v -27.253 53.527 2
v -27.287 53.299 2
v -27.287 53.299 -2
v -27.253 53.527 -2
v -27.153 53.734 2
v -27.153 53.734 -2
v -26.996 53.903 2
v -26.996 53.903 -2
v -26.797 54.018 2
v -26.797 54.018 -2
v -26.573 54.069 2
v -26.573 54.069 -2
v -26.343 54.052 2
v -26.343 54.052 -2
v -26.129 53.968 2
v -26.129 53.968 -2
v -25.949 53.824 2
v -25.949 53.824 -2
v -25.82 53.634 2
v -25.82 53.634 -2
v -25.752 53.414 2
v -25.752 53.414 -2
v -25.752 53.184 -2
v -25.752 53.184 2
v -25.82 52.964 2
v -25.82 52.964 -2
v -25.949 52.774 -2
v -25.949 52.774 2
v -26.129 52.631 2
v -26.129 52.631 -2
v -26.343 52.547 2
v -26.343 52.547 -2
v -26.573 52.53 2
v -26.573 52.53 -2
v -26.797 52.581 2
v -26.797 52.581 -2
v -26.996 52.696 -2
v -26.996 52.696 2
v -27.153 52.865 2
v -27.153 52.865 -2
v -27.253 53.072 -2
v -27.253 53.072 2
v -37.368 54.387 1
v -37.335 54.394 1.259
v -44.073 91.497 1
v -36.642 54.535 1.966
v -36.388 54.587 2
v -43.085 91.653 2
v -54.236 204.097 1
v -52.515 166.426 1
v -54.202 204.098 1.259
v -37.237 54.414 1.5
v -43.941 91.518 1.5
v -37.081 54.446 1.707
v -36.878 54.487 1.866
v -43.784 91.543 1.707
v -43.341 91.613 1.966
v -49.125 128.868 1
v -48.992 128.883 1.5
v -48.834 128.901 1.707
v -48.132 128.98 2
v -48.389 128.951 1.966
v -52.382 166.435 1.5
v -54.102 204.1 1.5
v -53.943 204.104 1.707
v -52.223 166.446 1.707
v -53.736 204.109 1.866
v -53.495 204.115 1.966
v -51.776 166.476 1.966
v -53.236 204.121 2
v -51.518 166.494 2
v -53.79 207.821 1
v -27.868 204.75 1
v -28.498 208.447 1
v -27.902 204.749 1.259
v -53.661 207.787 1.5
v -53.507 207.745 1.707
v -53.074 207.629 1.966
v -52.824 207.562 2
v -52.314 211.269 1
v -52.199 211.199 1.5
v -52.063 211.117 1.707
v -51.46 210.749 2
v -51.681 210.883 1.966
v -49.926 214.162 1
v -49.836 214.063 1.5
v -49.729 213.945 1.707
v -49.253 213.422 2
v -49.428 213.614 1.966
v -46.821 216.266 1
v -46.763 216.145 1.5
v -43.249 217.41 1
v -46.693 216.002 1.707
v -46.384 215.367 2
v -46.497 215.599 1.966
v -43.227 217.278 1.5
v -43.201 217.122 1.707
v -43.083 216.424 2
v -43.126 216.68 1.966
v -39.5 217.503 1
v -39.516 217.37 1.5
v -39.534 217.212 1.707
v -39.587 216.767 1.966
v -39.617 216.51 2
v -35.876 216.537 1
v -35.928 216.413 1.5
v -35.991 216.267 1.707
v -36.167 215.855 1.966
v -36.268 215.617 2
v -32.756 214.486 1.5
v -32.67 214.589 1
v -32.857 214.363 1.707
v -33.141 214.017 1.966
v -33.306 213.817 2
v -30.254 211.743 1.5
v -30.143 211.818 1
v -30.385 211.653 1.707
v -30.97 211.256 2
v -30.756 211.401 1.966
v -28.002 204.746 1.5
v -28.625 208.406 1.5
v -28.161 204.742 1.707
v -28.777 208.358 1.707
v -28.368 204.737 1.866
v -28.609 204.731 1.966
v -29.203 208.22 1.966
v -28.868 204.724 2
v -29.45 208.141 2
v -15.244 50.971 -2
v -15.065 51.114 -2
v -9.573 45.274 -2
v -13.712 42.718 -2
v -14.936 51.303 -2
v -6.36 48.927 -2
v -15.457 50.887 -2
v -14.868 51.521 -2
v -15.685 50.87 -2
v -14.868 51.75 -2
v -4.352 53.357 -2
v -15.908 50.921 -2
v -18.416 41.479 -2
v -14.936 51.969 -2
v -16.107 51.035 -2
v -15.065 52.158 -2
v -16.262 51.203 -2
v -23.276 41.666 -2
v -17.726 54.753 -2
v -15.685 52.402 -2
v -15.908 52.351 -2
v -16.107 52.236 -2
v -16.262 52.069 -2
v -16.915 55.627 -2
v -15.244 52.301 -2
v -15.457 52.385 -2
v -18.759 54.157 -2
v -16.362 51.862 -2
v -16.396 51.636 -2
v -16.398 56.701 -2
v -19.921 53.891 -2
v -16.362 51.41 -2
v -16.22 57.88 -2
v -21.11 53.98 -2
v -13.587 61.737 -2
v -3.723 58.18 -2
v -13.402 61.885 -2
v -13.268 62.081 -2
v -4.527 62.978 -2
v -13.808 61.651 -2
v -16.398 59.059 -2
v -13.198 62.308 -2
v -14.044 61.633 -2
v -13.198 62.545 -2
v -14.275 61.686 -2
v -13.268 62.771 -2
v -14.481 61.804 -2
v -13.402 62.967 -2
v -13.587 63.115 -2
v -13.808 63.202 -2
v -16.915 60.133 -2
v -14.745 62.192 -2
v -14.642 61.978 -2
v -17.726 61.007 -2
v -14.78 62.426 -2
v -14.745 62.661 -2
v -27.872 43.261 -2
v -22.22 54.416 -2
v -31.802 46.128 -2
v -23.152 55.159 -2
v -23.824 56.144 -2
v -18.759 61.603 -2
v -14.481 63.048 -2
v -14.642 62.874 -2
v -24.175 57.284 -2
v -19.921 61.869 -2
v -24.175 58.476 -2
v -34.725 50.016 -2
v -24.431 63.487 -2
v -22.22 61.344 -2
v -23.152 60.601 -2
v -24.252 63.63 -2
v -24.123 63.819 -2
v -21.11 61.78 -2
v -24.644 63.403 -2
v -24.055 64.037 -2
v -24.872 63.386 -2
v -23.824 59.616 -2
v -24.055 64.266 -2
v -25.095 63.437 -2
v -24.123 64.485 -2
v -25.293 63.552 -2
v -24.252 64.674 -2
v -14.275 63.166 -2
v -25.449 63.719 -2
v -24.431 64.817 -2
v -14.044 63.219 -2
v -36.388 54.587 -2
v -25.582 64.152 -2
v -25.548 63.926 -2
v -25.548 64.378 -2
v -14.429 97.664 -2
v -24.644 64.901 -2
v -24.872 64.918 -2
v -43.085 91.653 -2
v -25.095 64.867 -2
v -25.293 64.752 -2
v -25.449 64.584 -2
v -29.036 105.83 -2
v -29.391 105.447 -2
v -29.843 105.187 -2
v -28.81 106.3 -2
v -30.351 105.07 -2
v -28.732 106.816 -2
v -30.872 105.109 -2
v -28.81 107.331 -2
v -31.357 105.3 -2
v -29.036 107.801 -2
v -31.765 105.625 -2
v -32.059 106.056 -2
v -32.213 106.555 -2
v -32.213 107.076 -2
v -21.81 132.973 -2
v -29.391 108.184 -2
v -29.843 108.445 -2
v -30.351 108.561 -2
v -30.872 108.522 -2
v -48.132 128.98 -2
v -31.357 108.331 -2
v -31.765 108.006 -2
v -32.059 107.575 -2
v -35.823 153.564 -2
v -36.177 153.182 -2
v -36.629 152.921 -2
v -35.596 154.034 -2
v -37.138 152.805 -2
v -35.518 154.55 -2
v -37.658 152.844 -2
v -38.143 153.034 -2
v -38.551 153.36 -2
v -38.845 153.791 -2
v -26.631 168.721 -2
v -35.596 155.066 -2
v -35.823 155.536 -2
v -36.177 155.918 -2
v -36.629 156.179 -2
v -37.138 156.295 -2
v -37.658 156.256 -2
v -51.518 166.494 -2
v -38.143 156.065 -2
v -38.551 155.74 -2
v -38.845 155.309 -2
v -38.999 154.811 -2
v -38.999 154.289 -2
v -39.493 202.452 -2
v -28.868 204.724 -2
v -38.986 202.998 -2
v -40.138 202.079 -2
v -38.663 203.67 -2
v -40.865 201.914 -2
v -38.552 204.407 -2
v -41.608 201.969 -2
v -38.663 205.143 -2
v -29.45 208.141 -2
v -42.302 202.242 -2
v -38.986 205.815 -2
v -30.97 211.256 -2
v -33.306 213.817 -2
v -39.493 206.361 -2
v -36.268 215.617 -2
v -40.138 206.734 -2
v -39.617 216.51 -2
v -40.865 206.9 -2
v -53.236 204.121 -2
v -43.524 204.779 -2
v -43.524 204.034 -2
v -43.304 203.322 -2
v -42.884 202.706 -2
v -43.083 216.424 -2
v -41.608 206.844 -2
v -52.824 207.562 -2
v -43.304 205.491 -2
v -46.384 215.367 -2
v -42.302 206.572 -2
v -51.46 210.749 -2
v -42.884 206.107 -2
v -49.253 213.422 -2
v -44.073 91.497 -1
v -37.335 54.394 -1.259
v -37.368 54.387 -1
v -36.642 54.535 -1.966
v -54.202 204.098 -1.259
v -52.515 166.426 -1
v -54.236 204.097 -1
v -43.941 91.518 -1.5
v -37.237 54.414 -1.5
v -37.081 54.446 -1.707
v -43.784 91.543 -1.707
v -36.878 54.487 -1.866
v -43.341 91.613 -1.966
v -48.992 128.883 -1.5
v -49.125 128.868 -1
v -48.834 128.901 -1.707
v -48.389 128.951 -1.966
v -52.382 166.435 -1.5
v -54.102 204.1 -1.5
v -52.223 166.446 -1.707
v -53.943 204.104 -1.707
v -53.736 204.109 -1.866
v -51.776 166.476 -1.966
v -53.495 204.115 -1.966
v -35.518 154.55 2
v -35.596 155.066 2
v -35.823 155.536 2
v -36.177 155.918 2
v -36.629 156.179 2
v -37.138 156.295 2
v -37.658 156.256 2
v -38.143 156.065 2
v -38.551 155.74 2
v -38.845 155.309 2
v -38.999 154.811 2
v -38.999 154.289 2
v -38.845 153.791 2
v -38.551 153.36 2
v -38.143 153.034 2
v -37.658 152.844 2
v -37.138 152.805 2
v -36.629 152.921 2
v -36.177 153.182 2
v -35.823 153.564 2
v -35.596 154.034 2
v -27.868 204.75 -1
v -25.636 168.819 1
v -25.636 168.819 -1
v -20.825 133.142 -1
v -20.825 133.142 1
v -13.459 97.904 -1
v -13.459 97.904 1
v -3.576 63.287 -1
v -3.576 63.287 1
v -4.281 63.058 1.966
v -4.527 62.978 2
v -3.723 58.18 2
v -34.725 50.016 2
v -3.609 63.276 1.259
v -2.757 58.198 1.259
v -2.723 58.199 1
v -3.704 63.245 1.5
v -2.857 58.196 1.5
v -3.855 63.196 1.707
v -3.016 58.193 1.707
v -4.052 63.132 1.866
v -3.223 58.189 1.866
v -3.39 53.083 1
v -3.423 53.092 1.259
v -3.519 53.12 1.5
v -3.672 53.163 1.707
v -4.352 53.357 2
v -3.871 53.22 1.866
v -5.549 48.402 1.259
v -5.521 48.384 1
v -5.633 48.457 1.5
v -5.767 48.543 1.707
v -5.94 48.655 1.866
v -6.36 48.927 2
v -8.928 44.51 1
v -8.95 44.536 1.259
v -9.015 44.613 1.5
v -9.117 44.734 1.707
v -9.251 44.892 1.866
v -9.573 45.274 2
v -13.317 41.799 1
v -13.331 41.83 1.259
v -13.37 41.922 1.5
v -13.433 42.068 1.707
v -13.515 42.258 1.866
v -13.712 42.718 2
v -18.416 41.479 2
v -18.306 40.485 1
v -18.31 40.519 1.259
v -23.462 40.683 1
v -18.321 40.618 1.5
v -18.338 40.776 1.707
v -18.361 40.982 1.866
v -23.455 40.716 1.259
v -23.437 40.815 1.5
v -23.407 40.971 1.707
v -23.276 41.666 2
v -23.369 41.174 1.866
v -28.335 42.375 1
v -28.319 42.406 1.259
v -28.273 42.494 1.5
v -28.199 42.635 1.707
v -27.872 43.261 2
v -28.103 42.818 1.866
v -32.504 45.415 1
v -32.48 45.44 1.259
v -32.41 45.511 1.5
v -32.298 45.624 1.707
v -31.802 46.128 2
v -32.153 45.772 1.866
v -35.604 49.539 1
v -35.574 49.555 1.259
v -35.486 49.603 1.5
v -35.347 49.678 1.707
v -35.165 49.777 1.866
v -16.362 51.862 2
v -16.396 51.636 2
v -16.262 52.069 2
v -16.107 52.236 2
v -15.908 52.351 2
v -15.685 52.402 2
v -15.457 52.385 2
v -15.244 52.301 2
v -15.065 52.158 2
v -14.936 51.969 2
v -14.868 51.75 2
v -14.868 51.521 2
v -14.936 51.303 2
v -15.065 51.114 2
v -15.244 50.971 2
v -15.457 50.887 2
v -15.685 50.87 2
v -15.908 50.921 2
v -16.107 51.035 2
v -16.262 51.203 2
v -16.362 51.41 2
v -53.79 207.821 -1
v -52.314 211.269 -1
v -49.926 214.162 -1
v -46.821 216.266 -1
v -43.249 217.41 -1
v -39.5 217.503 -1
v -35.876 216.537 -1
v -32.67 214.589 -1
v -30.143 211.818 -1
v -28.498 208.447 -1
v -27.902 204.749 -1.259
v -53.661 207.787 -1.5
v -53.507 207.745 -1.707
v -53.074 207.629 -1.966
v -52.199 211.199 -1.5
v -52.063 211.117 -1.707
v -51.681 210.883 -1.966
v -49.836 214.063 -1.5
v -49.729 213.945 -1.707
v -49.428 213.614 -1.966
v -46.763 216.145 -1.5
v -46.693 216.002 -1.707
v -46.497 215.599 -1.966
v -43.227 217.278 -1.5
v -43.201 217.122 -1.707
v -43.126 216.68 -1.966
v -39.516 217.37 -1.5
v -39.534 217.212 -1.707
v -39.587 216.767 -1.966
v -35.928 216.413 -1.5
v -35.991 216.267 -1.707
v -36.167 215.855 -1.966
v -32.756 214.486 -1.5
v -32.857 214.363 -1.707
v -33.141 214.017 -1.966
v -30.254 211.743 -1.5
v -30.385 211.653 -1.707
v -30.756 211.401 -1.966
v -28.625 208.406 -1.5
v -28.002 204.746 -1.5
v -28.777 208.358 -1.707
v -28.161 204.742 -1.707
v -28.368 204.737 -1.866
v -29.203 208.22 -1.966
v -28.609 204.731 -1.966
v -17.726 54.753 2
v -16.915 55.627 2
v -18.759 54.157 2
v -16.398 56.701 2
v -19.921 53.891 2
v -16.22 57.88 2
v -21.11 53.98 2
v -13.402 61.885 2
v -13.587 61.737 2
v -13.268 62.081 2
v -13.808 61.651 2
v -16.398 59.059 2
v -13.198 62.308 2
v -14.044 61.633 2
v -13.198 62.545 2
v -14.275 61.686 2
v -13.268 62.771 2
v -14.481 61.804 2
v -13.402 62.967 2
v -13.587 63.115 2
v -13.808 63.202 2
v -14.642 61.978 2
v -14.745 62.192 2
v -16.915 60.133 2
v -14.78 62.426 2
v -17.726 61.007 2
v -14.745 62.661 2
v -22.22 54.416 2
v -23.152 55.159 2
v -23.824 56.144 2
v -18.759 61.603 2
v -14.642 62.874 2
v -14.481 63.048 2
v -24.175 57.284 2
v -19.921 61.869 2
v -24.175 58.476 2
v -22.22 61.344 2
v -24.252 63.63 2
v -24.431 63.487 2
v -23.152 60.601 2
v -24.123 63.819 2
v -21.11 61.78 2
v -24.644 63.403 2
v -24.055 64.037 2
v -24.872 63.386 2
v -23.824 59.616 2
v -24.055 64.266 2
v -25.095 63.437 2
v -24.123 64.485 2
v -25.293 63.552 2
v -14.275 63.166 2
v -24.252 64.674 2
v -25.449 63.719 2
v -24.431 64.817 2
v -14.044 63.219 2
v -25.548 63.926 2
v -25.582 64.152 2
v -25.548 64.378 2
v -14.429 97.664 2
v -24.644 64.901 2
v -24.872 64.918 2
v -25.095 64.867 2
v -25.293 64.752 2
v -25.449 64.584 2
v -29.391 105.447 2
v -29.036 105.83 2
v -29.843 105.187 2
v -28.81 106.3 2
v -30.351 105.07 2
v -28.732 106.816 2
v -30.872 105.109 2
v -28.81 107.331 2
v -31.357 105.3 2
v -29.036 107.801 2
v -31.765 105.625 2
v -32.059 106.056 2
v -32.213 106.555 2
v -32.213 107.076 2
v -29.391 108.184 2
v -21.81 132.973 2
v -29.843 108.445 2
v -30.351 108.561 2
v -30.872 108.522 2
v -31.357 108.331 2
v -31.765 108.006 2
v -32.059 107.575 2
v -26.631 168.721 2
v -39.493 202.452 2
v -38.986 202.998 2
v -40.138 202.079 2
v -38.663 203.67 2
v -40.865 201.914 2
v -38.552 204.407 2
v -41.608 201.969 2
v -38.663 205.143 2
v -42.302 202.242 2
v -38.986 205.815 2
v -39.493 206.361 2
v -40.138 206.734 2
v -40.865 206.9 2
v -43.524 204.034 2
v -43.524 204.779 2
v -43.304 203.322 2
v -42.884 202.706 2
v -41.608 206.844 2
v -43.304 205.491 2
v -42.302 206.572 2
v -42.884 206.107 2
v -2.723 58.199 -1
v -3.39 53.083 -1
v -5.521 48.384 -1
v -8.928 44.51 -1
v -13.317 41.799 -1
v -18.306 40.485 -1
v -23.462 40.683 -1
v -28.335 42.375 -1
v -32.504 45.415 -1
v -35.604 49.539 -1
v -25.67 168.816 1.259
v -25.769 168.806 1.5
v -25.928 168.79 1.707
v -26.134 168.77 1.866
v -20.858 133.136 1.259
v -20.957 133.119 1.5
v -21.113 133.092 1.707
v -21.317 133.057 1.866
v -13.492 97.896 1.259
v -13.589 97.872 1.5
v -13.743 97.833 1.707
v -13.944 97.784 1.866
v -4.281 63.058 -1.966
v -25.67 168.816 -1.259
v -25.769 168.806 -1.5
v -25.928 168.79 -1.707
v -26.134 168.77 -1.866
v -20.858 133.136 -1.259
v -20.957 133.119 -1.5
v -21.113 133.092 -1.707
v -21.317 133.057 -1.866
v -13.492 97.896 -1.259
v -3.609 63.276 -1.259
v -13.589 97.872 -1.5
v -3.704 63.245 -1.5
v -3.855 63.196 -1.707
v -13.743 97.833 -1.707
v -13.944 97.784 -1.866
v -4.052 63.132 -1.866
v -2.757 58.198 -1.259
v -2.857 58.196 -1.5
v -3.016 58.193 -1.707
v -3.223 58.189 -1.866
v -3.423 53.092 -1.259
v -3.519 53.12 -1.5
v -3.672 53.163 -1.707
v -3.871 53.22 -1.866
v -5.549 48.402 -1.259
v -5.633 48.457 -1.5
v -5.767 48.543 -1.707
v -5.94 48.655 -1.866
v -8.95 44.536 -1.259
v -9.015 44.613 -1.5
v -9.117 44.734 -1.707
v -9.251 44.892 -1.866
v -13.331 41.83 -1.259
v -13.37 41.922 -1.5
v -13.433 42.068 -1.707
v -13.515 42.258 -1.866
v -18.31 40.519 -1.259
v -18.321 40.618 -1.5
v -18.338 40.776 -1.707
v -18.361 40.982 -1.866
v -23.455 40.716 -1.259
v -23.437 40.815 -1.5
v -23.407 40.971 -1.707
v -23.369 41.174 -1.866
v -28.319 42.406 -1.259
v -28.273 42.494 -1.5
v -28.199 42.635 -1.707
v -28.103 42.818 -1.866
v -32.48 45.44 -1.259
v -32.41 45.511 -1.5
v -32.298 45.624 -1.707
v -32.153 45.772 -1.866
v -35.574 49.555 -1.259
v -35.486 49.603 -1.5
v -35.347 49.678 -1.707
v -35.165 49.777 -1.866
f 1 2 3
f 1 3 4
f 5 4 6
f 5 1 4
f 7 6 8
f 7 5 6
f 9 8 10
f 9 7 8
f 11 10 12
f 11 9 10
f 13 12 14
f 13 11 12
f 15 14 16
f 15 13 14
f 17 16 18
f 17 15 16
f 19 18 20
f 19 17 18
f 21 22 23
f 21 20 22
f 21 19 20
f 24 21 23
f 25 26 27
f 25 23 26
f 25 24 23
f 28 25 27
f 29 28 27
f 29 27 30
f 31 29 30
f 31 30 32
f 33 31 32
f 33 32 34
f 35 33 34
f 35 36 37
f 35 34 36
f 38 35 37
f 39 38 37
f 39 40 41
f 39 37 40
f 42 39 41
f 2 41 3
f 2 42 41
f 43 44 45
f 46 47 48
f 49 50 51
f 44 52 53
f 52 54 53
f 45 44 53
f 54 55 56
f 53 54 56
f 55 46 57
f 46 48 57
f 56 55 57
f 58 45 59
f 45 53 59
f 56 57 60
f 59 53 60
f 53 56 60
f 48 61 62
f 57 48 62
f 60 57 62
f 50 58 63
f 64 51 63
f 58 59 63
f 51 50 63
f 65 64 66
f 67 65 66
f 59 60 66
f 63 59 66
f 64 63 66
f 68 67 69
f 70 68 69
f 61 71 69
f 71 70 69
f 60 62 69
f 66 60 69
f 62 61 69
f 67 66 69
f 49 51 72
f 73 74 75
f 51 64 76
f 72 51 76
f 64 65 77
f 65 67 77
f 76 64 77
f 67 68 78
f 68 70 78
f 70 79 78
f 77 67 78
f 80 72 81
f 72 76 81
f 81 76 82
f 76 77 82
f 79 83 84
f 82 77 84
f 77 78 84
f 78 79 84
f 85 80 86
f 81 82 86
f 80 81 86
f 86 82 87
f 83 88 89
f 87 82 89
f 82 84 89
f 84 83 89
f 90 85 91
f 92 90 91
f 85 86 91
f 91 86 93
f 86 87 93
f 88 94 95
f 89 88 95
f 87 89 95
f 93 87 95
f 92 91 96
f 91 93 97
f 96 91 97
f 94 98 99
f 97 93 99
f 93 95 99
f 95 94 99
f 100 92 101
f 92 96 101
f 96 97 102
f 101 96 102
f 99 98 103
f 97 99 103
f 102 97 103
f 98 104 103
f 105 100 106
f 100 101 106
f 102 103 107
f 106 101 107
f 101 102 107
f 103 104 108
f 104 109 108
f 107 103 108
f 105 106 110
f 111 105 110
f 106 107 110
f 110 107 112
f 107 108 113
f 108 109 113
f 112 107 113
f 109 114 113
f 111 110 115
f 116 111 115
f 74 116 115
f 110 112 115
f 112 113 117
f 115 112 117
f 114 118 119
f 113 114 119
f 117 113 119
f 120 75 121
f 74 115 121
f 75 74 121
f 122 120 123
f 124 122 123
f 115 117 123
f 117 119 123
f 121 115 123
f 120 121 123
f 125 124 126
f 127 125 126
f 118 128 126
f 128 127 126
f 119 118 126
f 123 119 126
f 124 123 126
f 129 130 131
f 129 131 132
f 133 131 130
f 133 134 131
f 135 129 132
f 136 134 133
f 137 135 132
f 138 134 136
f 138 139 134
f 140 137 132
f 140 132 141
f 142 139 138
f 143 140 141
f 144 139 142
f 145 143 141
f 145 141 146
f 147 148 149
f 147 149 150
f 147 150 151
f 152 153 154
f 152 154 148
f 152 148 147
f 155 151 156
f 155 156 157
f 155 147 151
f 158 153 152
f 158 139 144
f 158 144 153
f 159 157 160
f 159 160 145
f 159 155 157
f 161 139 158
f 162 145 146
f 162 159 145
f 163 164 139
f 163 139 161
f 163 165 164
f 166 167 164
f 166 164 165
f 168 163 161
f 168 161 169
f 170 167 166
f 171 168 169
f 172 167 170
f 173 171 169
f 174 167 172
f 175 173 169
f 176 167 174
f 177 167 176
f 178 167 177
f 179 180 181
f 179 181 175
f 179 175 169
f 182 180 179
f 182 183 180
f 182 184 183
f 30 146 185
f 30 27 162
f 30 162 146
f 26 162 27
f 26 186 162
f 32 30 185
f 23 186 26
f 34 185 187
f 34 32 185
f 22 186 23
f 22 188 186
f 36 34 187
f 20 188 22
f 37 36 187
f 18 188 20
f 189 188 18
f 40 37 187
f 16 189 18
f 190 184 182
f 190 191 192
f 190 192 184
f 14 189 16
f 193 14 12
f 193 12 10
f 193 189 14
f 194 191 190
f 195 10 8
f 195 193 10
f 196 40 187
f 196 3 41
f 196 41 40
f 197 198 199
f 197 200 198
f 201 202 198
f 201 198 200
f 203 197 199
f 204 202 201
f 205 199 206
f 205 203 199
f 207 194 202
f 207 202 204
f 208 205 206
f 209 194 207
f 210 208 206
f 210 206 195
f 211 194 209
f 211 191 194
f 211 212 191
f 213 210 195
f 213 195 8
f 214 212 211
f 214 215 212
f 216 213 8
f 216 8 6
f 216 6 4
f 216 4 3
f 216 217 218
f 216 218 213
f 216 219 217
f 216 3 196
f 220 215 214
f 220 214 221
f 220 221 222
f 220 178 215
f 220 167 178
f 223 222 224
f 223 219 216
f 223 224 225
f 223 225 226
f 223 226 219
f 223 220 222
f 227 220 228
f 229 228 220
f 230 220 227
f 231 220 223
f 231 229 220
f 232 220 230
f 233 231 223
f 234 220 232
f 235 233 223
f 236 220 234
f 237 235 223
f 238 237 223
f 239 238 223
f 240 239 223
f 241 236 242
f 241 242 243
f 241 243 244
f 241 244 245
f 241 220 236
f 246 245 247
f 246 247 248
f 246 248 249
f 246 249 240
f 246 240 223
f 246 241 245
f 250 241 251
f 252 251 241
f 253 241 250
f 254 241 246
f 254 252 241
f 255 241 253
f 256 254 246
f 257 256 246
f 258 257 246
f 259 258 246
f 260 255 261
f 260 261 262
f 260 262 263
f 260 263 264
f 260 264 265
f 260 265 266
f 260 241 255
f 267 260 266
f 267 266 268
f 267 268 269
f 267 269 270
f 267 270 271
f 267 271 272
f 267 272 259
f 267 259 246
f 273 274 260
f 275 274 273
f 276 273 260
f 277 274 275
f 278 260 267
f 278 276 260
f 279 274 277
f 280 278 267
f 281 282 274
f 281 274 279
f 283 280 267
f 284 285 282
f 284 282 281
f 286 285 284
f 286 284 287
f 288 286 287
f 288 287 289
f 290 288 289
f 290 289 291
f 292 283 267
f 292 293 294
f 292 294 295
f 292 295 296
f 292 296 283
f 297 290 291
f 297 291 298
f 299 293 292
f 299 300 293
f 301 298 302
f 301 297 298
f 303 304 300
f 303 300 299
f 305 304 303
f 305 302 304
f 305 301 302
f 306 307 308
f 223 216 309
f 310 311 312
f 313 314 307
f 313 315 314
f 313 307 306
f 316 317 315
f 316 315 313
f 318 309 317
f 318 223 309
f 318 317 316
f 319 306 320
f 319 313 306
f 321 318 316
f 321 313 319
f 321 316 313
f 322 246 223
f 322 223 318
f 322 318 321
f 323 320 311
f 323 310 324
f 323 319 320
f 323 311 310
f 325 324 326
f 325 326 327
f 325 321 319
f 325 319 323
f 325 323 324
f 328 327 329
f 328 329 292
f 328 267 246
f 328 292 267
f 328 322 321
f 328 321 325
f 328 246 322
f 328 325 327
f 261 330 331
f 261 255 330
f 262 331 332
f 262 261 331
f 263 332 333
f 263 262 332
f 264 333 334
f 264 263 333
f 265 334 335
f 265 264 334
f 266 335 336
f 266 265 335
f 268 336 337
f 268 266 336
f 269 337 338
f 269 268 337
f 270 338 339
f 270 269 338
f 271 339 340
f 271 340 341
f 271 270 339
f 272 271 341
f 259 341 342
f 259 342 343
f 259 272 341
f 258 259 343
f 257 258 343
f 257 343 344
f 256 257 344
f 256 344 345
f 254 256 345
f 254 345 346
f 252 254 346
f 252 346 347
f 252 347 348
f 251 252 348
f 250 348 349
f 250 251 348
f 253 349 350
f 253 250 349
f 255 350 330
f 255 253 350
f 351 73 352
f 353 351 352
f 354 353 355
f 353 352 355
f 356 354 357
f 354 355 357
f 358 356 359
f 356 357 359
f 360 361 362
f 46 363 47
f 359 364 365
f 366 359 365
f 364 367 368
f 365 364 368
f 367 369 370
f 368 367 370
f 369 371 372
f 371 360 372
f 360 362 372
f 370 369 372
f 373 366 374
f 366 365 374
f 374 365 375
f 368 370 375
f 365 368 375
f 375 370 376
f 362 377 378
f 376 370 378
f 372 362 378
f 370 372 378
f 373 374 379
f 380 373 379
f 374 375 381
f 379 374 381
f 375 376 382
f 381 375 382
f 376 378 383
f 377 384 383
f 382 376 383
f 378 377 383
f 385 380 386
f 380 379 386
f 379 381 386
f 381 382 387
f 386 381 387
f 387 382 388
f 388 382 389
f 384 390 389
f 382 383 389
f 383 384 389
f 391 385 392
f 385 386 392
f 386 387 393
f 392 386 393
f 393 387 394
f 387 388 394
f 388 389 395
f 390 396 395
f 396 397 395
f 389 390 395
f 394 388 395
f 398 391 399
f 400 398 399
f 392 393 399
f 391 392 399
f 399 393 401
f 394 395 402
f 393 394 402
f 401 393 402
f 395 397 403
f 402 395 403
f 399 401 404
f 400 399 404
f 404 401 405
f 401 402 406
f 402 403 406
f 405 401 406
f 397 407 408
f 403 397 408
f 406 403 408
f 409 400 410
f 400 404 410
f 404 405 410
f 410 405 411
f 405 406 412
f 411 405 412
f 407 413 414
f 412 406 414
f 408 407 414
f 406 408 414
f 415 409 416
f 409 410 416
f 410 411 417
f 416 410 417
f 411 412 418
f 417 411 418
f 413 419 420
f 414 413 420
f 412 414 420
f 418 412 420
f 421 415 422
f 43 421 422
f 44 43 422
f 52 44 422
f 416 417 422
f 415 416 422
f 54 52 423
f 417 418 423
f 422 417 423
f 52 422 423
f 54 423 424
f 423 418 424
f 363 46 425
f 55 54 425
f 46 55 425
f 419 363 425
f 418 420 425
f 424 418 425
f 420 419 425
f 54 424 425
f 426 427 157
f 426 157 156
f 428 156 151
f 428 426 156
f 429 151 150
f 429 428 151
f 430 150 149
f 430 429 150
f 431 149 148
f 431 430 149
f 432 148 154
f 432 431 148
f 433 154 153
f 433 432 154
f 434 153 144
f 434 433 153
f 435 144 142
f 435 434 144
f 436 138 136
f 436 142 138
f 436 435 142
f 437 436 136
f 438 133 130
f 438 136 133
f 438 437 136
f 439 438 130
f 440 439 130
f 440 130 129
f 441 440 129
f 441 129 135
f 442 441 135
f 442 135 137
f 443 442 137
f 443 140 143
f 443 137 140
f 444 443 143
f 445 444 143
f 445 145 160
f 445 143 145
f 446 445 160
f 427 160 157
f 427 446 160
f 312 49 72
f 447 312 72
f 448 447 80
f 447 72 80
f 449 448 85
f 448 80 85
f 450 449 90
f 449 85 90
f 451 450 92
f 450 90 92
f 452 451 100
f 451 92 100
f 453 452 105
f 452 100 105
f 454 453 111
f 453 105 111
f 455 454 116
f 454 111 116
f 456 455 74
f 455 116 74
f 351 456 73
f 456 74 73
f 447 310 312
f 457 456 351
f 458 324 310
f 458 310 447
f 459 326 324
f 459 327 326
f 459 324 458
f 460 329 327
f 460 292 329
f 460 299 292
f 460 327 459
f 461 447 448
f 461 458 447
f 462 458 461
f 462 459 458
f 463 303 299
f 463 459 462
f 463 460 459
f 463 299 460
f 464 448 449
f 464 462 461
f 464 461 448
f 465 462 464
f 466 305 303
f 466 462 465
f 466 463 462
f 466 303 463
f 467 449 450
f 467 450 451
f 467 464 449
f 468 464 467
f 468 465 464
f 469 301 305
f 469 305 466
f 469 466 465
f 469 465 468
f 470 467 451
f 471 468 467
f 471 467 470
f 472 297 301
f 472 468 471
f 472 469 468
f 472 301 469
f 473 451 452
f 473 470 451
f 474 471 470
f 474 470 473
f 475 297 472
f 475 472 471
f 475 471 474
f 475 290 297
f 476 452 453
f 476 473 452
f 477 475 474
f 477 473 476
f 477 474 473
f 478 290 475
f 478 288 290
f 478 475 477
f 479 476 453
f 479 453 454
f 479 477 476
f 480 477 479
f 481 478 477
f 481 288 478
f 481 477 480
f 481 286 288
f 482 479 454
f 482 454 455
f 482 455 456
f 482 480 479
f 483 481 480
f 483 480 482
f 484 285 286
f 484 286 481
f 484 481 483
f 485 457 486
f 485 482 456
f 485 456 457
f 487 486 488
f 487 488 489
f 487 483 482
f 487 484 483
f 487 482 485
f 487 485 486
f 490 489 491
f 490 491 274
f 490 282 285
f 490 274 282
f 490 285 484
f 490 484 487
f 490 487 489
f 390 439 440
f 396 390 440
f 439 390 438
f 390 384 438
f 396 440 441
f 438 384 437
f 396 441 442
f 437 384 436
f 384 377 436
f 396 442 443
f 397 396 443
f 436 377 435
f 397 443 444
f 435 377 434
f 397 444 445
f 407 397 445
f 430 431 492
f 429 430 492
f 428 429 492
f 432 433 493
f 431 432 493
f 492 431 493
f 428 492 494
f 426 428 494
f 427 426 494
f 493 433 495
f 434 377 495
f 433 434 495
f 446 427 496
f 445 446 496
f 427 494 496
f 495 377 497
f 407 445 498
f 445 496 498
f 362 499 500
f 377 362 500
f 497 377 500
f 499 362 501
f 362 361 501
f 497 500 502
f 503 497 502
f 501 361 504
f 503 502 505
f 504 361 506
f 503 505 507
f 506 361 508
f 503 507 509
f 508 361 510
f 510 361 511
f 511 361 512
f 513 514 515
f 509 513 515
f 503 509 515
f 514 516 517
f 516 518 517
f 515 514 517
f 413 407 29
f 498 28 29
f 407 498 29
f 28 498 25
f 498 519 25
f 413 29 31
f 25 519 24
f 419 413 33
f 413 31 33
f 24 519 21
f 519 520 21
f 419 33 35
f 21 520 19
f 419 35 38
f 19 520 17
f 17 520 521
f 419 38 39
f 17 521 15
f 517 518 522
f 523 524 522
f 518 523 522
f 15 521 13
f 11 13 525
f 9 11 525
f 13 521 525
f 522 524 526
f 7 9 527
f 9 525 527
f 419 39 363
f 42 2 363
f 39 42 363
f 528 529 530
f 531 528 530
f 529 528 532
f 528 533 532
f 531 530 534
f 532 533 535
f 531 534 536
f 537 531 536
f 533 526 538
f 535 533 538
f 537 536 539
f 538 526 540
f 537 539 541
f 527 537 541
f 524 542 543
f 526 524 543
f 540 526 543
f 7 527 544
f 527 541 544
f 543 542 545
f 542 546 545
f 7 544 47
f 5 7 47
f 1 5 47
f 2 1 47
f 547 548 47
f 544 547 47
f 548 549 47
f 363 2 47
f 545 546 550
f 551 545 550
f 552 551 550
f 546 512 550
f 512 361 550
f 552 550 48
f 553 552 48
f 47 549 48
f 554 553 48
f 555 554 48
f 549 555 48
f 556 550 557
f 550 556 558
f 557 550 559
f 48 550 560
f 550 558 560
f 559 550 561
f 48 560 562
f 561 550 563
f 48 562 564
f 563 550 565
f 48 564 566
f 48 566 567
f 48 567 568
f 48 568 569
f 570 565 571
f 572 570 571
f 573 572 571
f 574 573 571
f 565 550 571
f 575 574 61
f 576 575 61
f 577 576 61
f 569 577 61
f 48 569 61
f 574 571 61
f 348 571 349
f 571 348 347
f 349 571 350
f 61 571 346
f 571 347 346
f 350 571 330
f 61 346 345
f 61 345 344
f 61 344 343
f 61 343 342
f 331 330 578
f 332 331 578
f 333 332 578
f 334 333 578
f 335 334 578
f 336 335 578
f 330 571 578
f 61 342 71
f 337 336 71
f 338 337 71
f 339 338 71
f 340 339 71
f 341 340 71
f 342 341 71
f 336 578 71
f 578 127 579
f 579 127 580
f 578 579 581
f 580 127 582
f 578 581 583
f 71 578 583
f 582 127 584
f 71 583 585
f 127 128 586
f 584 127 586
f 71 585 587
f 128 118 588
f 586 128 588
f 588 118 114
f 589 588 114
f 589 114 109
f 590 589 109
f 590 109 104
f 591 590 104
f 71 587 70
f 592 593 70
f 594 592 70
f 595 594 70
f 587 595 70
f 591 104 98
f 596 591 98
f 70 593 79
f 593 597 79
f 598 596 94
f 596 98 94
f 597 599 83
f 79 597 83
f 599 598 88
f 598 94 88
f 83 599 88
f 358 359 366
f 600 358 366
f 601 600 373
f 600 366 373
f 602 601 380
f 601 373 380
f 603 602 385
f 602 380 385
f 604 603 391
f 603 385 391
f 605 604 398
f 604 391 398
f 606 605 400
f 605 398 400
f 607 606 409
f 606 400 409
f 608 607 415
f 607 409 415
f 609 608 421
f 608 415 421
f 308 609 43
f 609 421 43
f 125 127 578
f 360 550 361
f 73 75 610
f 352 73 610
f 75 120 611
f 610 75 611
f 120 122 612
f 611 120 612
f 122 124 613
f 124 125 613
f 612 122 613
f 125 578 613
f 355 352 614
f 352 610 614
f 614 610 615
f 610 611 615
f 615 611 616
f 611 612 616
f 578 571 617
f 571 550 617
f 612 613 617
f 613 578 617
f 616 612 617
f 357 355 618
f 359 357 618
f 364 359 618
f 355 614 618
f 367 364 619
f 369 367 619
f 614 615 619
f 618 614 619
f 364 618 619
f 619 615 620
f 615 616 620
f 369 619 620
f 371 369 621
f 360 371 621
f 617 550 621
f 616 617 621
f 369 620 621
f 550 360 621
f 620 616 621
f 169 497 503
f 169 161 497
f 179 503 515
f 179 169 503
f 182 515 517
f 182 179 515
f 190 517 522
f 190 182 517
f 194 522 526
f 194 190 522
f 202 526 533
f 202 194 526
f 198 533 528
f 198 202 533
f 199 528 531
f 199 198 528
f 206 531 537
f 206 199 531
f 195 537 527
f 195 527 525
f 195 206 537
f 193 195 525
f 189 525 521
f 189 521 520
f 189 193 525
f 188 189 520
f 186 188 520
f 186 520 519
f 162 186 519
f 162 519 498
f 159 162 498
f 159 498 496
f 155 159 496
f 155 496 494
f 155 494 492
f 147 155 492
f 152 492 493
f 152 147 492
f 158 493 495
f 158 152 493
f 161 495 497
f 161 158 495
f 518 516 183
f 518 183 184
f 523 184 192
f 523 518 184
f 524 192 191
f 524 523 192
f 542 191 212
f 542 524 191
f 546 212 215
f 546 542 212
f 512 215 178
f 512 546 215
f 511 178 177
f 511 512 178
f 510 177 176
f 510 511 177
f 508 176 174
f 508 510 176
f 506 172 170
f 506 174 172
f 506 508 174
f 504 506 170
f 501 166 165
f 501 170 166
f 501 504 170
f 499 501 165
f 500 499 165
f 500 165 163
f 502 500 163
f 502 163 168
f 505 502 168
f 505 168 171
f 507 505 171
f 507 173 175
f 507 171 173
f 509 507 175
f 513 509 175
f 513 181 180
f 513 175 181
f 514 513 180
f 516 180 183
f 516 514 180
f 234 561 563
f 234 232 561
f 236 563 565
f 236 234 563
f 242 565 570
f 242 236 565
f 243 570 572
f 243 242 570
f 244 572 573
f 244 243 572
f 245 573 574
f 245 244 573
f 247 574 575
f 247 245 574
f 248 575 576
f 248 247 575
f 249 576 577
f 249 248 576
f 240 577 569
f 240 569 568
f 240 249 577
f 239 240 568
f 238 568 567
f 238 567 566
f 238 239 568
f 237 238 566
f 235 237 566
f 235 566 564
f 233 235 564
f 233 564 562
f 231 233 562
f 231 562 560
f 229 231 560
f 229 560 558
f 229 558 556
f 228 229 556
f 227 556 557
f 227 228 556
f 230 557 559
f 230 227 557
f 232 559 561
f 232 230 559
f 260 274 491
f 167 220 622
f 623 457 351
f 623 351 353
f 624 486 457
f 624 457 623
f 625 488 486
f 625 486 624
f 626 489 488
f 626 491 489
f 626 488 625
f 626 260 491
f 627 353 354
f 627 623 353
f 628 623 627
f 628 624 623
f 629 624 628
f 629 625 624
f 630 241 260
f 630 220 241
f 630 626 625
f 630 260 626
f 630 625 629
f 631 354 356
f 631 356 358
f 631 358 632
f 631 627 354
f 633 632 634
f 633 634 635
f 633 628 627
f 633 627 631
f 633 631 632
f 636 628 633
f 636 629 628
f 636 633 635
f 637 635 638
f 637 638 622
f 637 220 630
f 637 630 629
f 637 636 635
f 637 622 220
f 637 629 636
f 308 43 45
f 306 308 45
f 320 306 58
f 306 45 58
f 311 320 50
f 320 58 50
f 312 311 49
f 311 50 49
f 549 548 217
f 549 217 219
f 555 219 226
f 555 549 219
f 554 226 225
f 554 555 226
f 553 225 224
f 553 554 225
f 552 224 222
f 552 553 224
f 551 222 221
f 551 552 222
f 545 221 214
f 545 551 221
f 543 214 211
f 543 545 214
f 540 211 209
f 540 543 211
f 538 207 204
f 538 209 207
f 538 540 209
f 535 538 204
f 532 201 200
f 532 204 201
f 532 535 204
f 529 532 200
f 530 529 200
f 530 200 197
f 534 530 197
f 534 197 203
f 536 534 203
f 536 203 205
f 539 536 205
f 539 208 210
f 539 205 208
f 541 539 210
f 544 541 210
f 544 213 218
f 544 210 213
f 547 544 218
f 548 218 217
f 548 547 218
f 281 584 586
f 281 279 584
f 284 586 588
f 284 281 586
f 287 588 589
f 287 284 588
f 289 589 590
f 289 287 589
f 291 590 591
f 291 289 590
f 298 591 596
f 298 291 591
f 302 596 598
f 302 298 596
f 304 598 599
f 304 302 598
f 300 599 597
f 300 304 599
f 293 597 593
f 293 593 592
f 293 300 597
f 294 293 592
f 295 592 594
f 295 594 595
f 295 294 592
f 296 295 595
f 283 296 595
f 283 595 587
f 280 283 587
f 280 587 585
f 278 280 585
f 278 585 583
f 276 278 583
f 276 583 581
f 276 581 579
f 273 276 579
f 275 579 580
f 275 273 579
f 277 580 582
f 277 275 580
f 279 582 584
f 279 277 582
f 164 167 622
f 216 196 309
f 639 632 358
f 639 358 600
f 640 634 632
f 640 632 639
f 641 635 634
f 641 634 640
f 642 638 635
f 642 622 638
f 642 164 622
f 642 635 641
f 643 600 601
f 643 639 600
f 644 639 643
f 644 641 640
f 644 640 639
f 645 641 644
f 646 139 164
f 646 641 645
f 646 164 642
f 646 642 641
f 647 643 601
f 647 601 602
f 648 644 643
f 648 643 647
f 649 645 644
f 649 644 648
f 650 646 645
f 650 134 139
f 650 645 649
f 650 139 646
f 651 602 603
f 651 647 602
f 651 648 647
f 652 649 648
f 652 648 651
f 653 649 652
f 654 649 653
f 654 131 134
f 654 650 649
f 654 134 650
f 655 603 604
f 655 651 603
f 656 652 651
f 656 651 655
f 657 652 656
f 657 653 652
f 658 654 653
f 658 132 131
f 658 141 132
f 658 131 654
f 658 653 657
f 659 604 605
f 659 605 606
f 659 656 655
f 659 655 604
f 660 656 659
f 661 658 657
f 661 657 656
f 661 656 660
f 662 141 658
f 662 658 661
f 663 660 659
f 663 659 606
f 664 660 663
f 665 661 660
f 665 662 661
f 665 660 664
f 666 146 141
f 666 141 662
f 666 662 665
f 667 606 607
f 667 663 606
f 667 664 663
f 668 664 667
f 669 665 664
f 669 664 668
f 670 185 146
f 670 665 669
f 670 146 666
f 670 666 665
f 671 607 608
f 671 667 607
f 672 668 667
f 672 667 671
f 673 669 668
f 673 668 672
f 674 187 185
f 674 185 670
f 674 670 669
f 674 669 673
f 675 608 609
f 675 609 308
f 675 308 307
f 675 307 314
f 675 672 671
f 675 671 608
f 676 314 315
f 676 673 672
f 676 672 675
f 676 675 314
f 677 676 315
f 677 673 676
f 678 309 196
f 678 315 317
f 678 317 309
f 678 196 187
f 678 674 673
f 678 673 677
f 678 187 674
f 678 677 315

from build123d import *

# Parameters (mm, degrees)
SKETCH4_R               = 4
SKETCH4_R_2             = 2.5
SKETCH4_R_3             = 1.75
BOSS_EXTRUDE2_DEPTH     = 2
FILLET3_R               = 1
CUT_EXTRUDE1_DEPTH      = 225.288694563
CUT_EXTRUDE1_DEPTH_BACK = 225.288694563
SKETCH6_R               = 0.767868533
SKETCH6_R_2             = 0.771761199
SKETCH6_R_3             = 0.768034618
SKETCH6_R_4             = 0.795284138


with BuildPart() as part:
    # Sketch4 → Boss-Extrude2 (new, symmetric)
    with BuildSketch(Plane.XY):
        with BuildLine():
            ThreePointArc((-37.367897149, 54.387204077), (-49.125443785, 128.867751214), (-54.236117249, 204.097218987))
            ThreePointArc((-54.236117249, 204.097218987), (-41.377914553, 217.590696941), (-27.867941637, 204.749826423))
            ThreePointArc((-27.867941637, 204.749826423), (-20.824641361, 133.142032668), (-3.576140657, 63.286657579))
            ThreePointArc((-3.576140657, 63.286657579), (-15.763142173, 40.957044634), (-37.367897149, 54.387204077))
        make_face()
        with Locations((-20.22, 57.88)):
            Circle(SKETCH4_R, mode=Mode.SUBTRACT)
        with Locations((-41.051610566, 204.406598272)):
            Circle(SKETCH4_R_2, mode=Mode.SUBTRACT)
        with Locations((-37.268473007, 154.549924996)):
            Circle(SKETCH4_R_3, mode=Mode.SUBTRACT)
        with Locations((-30.482103359, 106.815562065)):
            Circle(SKETCH4_R_3, mode=Mode.SUBTRACT)
    extrude(amount=BOSS_EXTRUDE2_DEPTH, both=True)

    # Fillet3
    fillet3_edges = [part.edges().sort_by_distance(p)[0] for p in [
        (-41.377914553, 217.590696941, -2),
        (-20.824641361, 133.142032668, -2),
        (-15.763142173, 40.957044634, -2),
        (-49.125443785, 128.867751214, -2),
        (-49.125443785, 128.867751214, 2),
        (-15.763142173, 40.957044634, 2),
        (-20.824641361, 133.142032668, 2),
        (-41.377914553, 217.590696941, 2),
    ]]
    fillet(fillet3_edges, radius=FILLET3_R)

    # Sketch6 → Cut-Extrude1 (cut, two sides: drawn at the far end of the back side and taken through both)
    with BuildSketch(Plane(origin=(0, 0, -2), x_dir=(-1, 0, 0), z_dir=(0, 0, -1)).offset(-CUT_EXTRUDE1_DEPTH_BACK)):
        with Locations((24.81448084, 64.15193249)):
            Circle(SKETCH6_R)
        with Locations((26.515189166, 53.299256498)):
            Circle(SKETCH6_R_2)
        with Locations((15.627794635, 51.635896996)):
            Circle(SKETCH6_R_3)
        with Locations((13.984842021, 62.426172158)):
            Circle(SKETCH6_R_4)
    extrude(amount=CUT_EXTRUDE1_DEPTH + CUT_EXTRUDE1_DEPTH_BACK, mode=Mode.SUBTRACT)


solid = part.part
